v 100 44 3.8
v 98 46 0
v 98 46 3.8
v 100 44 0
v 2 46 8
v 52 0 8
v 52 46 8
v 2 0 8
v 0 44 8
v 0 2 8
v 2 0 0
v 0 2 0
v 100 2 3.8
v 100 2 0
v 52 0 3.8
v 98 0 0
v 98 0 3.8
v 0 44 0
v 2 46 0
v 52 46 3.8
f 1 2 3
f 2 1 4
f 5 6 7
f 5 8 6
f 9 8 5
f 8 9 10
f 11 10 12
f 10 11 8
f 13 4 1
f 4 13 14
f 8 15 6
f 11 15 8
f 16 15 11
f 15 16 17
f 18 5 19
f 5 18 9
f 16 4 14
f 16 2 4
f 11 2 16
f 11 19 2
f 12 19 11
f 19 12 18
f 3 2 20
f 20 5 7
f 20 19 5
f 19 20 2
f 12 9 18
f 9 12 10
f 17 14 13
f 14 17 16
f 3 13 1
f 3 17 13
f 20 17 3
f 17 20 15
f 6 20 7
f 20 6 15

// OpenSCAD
$fn = 32;

// ----------------------------------------------------------------------
// Stepped bar: endstep, 100 x 46 x 8/3.8 mm
// ----------------------------------------------------------------------

// --- parameters (mm) ---
bar_l = 100;              // bar length, X
bar_w = 46;               // bar width, Y
plate_t = 8;              // thickness of the thick zone, Z
thin_t = 3.8;             // thickness of the thin zone
corner_c = 2;             // corner chamfer of the bar
step_cut = 4.2;           // material removed from the thin zone
step_x = 52;              // step position from the left end
depth_1 = 4.2;            // depth of cut 1 from the top face

profile = [[2, 0], [98, 0], [100, 2], [100, 44], [98, 46], [2, 46], [0, 44], [0, 2]];  // primary outline, 8 points, counter clockwise
void_1 = [[52, -1], [101, -1], [101, 47], [52, 47]];  // thin zone beyond the step, 4 points

// --- the one profile operation ---
difference() {
  linear_extrude(height = plate_t) polygon(points = profile);
  translate([0, 0, plate_t - depth_1])
    linear_extrude(height = depth_1 + 1) polygon(points = void_1);
}
